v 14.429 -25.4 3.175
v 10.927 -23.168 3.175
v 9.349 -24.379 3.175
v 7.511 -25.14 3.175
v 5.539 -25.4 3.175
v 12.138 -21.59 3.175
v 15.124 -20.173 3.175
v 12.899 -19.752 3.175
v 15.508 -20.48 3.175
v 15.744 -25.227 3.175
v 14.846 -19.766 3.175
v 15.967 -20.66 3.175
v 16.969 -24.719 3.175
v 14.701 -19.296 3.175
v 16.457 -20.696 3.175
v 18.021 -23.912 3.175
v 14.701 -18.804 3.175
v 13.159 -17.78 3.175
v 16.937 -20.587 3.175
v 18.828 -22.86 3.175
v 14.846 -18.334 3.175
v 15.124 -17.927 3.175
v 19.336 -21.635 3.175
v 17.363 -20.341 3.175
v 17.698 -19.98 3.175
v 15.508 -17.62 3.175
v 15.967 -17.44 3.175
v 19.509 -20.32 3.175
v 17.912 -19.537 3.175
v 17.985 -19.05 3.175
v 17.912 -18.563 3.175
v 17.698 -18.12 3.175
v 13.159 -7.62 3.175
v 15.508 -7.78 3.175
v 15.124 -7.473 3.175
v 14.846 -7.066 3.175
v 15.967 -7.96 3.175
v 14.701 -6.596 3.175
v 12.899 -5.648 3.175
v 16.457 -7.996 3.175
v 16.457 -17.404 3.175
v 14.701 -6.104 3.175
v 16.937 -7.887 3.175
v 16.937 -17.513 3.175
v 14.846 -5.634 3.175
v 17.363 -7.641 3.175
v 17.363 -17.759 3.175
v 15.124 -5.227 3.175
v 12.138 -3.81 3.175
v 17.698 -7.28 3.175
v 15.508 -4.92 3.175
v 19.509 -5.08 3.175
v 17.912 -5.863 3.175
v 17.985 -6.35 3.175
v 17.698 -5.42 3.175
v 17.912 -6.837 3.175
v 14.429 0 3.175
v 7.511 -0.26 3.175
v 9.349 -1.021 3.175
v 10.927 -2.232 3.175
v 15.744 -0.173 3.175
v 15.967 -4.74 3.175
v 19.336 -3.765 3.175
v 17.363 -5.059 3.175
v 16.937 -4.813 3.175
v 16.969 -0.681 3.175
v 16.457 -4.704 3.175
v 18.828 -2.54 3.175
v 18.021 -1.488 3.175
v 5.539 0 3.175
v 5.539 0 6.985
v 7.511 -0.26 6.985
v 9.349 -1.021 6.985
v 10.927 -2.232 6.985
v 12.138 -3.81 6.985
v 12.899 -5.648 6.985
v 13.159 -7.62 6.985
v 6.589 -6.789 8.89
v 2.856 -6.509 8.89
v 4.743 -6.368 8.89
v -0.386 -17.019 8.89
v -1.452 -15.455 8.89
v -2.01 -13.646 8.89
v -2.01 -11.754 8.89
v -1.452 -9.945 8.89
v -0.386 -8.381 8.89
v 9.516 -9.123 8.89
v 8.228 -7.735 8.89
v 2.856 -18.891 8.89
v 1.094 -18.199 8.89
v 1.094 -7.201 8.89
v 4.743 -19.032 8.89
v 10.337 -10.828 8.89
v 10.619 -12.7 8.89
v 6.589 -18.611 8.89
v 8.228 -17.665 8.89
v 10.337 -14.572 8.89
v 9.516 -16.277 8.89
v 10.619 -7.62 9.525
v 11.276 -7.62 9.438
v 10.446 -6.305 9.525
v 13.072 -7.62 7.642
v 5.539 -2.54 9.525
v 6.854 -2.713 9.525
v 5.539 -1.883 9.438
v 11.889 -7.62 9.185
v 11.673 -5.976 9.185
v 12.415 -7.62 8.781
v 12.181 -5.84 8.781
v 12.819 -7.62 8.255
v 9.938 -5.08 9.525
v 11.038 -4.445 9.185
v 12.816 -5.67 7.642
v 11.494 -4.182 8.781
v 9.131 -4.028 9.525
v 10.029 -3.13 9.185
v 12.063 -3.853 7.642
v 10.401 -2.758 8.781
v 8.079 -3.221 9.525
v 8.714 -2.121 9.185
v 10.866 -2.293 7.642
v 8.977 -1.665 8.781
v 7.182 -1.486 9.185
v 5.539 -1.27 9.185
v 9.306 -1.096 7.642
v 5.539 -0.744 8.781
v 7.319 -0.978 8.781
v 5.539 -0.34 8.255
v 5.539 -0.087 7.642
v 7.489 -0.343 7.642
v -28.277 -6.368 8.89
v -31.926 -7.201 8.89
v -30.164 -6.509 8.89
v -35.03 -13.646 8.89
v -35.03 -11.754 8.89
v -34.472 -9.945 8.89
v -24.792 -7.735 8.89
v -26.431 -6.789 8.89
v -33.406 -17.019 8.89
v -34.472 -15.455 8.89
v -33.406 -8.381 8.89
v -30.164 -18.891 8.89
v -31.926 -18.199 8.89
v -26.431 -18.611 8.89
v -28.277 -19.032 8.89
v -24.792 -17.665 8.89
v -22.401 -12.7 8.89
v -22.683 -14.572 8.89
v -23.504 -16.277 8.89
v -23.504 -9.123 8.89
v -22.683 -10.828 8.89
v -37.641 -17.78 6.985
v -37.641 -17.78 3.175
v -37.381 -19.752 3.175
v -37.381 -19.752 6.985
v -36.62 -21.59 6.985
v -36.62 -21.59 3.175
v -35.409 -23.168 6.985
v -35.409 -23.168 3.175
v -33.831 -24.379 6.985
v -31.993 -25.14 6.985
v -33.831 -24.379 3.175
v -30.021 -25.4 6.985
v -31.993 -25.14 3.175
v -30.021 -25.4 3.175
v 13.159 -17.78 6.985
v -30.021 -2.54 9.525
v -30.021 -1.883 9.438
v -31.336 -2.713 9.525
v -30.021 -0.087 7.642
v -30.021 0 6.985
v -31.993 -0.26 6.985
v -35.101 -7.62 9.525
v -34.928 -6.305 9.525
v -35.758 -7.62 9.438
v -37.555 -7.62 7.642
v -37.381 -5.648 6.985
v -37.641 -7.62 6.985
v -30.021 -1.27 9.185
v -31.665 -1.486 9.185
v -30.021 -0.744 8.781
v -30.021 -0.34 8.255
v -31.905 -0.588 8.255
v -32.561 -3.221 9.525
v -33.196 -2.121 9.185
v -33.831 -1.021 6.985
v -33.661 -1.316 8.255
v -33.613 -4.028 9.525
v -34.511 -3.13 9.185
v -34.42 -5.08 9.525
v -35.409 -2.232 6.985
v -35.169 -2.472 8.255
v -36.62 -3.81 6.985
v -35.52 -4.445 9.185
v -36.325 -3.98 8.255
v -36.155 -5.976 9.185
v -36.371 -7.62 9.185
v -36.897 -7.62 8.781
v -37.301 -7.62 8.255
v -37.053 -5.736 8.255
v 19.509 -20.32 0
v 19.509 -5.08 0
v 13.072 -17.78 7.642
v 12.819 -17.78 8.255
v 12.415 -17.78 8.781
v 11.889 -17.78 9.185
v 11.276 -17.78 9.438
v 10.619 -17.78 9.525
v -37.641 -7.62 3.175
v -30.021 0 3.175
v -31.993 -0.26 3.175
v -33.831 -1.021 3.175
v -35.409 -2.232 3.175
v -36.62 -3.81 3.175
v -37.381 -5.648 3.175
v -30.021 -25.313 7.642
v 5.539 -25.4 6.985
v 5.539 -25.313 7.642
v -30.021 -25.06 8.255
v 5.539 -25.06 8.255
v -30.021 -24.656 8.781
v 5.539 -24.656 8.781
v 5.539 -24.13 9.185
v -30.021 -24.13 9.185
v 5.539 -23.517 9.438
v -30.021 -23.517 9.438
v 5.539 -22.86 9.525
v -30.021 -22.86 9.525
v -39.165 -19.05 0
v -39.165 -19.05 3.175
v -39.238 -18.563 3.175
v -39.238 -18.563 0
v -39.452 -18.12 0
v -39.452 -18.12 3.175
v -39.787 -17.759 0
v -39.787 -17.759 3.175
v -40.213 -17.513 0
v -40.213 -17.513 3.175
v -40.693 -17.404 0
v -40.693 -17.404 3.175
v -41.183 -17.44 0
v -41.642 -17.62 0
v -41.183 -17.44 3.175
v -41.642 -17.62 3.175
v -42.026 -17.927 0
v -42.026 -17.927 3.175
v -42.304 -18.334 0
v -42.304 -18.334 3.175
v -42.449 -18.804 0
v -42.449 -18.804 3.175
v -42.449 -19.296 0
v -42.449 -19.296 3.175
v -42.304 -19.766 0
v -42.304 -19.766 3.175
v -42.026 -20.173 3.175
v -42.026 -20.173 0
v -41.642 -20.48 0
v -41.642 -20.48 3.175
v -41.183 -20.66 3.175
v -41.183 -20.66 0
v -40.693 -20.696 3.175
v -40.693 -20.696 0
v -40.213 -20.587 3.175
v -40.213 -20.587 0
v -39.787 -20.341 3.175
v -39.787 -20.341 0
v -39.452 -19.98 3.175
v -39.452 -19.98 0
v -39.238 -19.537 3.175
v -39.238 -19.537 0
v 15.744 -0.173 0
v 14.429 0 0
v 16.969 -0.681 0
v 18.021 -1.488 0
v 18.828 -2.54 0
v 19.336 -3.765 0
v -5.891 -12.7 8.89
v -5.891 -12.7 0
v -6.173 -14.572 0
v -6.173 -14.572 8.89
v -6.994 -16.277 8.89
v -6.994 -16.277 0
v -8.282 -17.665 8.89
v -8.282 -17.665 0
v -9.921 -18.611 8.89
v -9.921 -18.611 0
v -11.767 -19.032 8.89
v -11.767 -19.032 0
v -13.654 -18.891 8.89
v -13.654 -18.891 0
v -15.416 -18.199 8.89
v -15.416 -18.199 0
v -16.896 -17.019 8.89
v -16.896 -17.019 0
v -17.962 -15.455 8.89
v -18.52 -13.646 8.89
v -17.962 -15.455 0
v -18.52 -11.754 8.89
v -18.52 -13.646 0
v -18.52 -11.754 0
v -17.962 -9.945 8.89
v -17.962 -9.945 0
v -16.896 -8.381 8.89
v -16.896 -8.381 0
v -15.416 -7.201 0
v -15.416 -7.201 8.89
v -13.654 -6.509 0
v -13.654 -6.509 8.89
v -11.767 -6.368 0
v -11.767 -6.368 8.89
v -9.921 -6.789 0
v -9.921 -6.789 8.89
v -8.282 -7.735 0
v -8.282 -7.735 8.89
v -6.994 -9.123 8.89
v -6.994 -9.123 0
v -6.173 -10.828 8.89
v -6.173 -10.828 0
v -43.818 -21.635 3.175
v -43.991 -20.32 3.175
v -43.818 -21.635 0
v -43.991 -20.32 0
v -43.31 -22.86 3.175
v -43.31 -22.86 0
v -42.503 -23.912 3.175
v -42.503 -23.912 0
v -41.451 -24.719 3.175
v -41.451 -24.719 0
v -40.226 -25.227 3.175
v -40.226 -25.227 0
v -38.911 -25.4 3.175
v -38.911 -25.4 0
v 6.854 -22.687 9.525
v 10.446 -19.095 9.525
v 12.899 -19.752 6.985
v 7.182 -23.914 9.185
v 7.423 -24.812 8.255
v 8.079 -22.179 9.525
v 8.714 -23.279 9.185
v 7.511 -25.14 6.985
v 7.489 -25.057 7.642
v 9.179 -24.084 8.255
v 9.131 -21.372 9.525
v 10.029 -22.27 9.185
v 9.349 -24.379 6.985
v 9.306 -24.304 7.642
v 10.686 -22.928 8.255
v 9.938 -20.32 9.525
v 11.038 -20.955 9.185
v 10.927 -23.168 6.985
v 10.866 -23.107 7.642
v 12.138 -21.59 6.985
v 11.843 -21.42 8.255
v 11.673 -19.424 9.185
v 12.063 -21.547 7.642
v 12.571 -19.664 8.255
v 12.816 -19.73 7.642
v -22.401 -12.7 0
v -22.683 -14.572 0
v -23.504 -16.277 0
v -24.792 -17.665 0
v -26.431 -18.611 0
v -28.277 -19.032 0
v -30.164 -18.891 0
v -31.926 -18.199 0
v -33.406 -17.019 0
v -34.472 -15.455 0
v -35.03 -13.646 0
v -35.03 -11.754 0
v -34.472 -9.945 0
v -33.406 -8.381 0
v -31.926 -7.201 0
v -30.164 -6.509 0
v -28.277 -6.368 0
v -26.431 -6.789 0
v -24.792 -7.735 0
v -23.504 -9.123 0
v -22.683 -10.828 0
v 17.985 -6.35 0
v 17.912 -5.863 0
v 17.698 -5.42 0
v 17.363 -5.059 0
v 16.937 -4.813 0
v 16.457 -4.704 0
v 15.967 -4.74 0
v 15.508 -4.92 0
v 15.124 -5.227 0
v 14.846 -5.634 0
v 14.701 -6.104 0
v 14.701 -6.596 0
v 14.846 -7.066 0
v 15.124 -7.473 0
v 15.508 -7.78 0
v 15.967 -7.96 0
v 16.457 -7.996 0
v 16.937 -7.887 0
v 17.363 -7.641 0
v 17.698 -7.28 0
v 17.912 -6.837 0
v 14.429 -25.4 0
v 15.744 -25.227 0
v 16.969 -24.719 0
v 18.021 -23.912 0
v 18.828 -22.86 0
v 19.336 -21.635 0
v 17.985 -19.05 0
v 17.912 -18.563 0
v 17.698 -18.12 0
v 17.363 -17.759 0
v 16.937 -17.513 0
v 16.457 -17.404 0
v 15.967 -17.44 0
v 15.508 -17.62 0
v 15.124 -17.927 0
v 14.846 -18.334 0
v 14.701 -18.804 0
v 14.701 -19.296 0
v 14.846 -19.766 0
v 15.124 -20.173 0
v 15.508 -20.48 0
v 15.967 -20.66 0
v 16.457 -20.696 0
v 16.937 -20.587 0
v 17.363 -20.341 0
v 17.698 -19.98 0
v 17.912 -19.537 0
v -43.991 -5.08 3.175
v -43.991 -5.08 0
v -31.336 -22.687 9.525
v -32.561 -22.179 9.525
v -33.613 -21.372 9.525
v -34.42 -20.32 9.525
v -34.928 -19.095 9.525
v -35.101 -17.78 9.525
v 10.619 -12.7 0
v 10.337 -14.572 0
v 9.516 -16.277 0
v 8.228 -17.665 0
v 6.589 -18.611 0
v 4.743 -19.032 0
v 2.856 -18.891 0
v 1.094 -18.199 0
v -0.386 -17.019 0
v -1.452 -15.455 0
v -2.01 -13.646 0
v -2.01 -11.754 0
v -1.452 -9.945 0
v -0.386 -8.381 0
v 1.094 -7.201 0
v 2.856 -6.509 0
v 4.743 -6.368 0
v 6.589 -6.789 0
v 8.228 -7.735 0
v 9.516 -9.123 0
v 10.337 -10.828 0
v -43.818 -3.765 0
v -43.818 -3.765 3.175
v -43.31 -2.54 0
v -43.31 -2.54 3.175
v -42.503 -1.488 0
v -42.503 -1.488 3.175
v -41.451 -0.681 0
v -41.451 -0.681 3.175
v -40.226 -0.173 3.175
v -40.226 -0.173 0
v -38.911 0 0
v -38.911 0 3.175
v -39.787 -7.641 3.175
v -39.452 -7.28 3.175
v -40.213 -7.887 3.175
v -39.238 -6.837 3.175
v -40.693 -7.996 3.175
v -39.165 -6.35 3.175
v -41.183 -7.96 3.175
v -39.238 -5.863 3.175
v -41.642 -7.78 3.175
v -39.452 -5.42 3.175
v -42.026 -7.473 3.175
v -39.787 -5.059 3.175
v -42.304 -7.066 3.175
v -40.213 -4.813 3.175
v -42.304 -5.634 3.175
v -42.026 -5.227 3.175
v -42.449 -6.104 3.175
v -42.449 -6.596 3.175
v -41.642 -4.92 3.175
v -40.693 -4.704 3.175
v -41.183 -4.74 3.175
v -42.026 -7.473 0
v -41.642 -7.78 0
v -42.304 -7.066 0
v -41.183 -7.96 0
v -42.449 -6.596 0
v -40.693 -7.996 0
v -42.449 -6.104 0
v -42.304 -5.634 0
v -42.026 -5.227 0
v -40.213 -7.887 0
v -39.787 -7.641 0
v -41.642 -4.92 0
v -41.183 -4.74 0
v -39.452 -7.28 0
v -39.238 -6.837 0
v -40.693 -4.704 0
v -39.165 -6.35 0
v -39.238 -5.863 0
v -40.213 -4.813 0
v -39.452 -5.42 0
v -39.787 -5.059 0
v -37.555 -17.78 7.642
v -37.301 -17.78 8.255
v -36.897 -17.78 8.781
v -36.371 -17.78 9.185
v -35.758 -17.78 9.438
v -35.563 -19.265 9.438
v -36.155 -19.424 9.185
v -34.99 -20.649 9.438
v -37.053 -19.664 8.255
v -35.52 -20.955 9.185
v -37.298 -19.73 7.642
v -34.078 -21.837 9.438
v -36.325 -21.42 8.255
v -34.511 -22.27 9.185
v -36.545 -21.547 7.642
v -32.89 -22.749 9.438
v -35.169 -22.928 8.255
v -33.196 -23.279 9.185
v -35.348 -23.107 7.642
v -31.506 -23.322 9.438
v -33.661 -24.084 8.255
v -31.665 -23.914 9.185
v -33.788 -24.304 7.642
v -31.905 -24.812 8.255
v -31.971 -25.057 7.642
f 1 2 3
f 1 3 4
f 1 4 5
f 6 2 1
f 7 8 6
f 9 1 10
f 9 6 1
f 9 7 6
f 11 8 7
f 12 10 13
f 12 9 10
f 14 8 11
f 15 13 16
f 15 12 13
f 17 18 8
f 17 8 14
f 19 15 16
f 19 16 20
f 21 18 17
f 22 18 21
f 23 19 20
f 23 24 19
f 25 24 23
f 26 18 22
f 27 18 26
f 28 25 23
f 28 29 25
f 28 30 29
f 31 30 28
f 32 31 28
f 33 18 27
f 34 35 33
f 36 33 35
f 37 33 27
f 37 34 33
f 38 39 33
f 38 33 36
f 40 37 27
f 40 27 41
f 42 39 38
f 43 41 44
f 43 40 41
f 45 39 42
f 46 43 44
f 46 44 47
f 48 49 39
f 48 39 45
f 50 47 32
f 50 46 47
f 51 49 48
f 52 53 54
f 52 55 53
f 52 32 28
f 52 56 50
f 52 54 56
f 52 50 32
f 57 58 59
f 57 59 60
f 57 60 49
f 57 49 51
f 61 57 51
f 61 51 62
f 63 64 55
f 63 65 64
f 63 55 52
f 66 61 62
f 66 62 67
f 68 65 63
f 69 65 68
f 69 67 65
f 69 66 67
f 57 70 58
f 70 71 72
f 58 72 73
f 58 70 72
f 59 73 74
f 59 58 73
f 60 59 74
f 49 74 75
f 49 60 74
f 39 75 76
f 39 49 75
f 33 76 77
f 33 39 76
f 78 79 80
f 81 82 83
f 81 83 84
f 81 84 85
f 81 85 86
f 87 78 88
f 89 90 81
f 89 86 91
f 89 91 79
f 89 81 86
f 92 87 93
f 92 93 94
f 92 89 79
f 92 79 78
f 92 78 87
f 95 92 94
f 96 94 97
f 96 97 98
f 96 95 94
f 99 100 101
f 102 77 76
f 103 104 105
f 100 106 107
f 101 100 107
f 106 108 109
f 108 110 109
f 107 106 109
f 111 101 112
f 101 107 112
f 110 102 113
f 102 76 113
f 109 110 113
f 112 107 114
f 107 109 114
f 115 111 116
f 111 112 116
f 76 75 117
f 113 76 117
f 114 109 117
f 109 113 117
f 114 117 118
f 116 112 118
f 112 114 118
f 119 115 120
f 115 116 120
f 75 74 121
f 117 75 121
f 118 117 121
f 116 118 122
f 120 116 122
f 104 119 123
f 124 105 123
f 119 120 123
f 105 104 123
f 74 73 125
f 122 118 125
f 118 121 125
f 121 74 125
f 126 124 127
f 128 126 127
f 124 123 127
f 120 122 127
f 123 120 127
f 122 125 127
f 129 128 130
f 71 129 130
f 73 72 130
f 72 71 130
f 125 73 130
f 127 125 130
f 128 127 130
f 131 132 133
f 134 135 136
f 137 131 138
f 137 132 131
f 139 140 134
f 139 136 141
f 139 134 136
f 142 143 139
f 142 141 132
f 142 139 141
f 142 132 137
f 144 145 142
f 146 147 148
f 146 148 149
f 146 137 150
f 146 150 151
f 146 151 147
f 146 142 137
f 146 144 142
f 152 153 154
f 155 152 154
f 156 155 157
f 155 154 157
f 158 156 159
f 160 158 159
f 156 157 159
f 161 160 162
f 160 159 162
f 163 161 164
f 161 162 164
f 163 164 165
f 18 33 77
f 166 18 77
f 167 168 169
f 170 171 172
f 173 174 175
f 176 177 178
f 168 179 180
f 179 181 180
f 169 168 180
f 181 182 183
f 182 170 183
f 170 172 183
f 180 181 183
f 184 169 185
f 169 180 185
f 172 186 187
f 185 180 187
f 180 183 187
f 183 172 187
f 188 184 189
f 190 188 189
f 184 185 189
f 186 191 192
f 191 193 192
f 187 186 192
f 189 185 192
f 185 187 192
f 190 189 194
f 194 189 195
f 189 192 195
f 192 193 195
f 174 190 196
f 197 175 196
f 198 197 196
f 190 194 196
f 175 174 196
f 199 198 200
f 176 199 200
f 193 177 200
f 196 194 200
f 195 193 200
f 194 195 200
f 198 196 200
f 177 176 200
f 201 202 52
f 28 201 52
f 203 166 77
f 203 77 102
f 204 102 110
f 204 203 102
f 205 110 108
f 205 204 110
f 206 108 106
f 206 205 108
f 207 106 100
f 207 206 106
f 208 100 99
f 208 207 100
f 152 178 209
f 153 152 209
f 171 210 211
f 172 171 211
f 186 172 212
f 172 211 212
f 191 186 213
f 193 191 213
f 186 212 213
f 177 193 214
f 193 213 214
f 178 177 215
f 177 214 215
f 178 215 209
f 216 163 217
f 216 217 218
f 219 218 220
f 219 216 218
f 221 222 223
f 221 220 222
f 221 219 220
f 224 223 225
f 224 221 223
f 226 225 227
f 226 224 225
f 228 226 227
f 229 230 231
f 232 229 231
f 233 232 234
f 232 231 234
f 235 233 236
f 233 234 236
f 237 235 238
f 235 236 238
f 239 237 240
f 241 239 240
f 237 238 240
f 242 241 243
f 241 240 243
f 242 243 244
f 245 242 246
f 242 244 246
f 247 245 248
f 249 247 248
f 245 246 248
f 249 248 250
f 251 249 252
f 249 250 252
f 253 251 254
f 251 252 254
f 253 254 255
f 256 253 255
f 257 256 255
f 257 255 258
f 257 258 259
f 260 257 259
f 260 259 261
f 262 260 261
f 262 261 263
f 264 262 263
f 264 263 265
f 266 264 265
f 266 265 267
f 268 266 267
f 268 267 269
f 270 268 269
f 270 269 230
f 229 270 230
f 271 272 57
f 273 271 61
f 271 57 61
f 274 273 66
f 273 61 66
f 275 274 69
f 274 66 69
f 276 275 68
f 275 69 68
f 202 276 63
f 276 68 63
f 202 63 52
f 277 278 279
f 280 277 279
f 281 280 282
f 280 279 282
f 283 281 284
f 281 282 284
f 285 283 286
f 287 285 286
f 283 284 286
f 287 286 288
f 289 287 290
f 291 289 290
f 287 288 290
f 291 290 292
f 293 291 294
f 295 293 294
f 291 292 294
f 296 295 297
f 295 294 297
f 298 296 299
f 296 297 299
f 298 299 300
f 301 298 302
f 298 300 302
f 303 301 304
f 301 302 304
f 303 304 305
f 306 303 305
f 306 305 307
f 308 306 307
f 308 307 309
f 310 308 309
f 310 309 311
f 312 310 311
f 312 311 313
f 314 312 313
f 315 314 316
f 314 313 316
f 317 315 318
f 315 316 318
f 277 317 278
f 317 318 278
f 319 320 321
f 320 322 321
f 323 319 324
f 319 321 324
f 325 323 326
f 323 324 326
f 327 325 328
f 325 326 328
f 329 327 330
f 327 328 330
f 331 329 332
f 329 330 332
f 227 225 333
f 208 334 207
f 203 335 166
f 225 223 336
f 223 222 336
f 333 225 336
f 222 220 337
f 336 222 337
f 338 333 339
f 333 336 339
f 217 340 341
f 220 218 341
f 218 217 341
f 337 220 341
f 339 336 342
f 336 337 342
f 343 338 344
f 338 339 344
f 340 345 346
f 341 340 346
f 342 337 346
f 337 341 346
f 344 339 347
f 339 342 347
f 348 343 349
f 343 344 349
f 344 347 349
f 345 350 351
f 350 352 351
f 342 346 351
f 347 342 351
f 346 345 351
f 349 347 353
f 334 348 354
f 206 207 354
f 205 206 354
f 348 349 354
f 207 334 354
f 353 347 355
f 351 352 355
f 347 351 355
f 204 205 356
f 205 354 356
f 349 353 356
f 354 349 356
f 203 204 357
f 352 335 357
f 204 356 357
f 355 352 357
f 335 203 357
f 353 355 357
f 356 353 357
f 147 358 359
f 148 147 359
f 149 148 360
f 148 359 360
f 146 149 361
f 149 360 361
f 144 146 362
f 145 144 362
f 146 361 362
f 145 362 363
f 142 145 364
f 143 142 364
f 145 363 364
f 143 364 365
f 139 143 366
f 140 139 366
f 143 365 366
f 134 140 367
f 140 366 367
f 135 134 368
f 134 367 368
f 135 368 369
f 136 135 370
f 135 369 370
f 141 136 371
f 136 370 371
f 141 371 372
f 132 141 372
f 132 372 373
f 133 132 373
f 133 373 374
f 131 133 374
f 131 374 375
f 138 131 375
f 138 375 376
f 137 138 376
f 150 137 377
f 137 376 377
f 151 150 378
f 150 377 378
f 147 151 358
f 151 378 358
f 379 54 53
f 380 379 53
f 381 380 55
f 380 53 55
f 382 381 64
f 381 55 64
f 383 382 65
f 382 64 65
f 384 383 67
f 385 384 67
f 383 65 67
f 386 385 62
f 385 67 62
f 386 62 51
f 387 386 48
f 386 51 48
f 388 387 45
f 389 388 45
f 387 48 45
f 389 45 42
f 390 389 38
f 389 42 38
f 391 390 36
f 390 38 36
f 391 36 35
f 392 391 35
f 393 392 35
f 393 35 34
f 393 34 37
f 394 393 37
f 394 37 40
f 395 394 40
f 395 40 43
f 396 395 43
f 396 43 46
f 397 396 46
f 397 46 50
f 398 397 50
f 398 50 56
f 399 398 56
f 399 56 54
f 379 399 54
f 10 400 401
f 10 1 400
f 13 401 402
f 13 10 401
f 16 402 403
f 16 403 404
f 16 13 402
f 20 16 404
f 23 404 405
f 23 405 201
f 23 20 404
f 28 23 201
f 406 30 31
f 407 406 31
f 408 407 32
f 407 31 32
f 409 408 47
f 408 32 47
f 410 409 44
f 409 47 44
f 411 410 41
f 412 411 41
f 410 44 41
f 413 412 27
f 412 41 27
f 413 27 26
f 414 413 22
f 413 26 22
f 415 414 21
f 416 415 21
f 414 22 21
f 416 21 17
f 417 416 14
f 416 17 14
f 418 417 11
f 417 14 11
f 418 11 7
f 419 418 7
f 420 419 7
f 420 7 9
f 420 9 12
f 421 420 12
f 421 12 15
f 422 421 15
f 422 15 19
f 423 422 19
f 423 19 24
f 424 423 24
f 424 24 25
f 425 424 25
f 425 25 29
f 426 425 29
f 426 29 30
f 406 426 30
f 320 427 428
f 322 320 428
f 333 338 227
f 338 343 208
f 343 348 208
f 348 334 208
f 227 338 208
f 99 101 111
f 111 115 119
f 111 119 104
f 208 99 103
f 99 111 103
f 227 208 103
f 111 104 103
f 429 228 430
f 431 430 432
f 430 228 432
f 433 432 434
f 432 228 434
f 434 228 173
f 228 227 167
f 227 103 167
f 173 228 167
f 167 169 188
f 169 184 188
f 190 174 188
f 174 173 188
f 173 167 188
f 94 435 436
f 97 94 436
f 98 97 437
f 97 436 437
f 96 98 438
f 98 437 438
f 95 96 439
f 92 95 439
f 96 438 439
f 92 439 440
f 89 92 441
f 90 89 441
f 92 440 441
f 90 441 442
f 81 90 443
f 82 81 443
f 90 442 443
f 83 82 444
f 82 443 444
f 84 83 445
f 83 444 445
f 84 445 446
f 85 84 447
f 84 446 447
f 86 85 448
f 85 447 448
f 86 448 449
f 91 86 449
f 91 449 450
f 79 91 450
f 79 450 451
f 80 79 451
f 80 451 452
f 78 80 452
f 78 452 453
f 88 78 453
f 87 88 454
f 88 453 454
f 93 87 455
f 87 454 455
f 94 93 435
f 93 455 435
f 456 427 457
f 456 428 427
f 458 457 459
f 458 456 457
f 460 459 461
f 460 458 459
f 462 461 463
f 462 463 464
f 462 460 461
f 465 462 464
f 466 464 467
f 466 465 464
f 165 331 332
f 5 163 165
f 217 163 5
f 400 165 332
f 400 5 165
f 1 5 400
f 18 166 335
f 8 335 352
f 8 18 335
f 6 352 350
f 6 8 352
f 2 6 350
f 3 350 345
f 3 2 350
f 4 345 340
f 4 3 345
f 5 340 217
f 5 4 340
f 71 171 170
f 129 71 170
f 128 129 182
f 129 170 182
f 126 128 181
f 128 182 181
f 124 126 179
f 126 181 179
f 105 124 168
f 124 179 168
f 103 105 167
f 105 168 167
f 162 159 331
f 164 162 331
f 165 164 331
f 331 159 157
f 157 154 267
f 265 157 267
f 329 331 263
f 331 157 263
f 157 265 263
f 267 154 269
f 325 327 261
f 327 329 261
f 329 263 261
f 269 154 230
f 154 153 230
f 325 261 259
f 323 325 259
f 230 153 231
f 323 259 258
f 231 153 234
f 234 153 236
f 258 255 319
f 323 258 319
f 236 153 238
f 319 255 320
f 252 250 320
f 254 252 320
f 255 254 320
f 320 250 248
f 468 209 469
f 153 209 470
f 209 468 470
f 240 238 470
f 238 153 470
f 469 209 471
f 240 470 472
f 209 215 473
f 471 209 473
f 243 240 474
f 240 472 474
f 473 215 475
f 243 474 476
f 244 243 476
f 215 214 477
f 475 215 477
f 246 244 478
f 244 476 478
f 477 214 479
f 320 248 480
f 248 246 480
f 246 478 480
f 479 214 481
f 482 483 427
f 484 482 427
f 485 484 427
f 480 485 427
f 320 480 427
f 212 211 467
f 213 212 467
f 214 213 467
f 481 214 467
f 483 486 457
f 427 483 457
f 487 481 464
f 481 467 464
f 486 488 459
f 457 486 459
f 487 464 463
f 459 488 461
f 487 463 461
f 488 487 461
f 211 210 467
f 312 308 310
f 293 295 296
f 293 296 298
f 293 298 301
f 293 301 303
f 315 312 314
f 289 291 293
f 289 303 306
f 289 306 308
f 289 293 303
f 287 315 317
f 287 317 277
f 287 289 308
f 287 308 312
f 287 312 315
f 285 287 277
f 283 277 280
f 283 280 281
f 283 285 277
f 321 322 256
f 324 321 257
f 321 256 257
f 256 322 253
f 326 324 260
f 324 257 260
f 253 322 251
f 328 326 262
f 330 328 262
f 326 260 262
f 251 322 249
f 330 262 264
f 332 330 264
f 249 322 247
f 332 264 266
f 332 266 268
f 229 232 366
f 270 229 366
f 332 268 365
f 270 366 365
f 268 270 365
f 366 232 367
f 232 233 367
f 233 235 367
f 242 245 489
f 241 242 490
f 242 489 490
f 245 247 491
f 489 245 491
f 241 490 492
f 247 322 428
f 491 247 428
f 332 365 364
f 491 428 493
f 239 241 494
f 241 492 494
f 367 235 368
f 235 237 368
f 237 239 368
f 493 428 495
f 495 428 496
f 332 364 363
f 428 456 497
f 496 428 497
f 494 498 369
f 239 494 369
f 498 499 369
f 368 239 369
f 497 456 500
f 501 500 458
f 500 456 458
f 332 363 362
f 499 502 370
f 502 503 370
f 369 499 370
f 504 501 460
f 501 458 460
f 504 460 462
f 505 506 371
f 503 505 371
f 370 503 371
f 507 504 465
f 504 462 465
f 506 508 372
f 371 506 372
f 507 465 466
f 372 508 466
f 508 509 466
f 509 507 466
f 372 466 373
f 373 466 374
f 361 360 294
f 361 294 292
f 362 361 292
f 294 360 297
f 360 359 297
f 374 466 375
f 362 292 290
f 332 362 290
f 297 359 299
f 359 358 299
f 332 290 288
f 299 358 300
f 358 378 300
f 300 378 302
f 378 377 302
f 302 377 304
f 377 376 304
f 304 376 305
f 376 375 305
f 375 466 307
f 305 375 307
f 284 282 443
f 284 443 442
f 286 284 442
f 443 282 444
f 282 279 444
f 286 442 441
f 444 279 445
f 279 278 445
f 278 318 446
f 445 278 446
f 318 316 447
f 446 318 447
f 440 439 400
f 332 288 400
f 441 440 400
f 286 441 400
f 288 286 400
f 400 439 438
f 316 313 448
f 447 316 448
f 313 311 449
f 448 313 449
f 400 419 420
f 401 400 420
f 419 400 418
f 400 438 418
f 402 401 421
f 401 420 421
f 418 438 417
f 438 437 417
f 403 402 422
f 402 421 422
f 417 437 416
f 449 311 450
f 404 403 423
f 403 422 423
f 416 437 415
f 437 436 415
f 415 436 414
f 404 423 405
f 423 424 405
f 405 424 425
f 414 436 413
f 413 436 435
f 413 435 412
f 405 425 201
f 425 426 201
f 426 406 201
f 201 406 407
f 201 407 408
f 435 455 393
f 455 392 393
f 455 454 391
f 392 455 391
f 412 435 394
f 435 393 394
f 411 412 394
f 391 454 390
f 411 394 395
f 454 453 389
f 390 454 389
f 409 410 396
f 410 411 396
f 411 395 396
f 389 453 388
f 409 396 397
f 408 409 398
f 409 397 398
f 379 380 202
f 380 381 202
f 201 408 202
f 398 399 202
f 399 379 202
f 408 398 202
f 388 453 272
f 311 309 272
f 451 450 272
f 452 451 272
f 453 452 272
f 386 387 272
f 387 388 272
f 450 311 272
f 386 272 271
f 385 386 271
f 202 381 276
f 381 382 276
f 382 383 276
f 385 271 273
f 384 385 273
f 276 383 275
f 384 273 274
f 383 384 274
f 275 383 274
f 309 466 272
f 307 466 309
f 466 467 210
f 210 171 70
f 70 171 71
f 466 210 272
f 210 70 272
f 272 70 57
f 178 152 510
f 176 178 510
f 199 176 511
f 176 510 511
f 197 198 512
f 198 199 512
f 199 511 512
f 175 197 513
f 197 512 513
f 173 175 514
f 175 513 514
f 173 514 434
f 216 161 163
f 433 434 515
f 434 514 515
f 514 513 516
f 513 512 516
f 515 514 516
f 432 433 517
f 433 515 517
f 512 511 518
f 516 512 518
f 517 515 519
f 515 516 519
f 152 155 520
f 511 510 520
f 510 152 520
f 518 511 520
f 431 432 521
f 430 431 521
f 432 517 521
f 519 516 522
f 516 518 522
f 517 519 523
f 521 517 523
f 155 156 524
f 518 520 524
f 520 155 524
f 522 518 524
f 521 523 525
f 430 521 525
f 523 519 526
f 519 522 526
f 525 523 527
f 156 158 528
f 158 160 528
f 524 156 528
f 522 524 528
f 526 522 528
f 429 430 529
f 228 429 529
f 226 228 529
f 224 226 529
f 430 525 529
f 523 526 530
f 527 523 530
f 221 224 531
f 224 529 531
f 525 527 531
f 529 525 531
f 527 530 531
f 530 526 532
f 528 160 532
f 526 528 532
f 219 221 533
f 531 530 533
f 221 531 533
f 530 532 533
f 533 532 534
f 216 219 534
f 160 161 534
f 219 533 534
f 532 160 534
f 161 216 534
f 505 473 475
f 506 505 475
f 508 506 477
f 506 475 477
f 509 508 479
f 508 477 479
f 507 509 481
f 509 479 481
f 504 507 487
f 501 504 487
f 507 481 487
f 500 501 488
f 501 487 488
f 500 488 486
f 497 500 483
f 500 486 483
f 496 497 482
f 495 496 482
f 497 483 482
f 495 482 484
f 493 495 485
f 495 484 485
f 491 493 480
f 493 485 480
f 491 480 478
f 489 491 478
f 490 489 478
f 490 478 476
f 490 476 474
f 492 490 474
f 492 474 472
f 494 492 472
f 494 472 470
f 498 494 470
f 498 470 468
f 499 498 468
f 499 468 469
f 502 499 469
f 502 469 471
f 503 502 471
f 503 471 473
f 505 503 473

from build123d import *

# Parameters (mm, degrees)
F1_DEPTH     = 25.4
F3_R         = 1.651
F4_DEPTH     = 3.176
F5_R         = 6.35
F6_DEPTH     = 8.89
F7_R         = 5.08
F8_R         = 2.54
F9_T1_DEPTH  = 6.35
F9_T4_ANGLE  = 90
F9_T6_ANGLE  = 90
F9_T8_ANGLE  = 90
F9_T10_ANGLE = 90


# Not quite as in the source:
# - a fillet or chamfer that OpenCascade refuses, or shapes differently, is made with other operations: its cross-section is extruded or revolved along the edge and cut away or added
# - a feature names something its author has since deleted; it is built from what else it names


with BuildPart() as f1:
    # F0 (on Front) → F1 (new body)
    with BuildSketch(Plane.XZ):
        Polygon((-43.9910670578, 3.175), (-43.9910670578, 0), (19.5089329422, 0), (19.5089329422, 3.175), (13.1589329422, 3.175), (13.1589329422, 9.525), (-37.6410670578, 9.525), (-37.6410670578, 3.175), align=None)
    extrude(amount=F1_DEPTH)

    # F3 (on face) → F4 (cut, through all)
    with BuildSketch(Plane.XY.offset(3.175)):
        with Locations((-40.8160670578, -19.05)):
            Circle(F3_R)
        with Locations((-40.8160670578, -6.35)):
            Circle(F3_R)
        with Locations((16.3339329422, -6.35)):
            Circle(F3_R)
        with Locations((16.3339329422, -19.05)):
            Circle(F3_R)
    extrude(amount=-F4_DEPTH, mode=Mode.SUBTRACT)

    # F5 (on face) → F6 (cut)
    with BuildSketch(Plane(origin=(0, 0, 0), x_dir=(1, 0, 0), z_dir=(0, 0, -1))):
        with Locations((-28.7510670578, 12.7)):
            Circle(F5_R)
        with Locations((4.2689329422, 12.7)):
            Circle(F5_R)
        with Locations((-12.2410670578, 12.7)):
            Circle(F5_R)
    extrude(amount=-F6_DEPTH, mode=Mode.SUBTRACT)

    # F7
    f7_edges = [f1.edges().sort_by_distance(p)[0] for p in [
        (19.508933, -25.4, 1.5875),
        (19.508933, 0, 1.5875),
        (-43.991067, -25.4, 1.5875),
        (-43.991067, 0, 1.5875),
    ]]
    fillet(f7_edges, radius=F7_R)

    # F8
    f8_edges = [f1.edges().sort_by_distance(p)[0] for p in [
        (-12.241067, -25.4, 9.525),
        (-37.641067, -12.7, 9.525),
        (-12.241067, 0, 9.525),
        (13.158933, -12.7, 9.525),
    ]]
    fillet(f8_edges, radius=F8_R)

    # F9: fillet of radius 7.62 on 4 edges, made by hand

    # F9_s2 → F9_t1 (cut)
    with BuildSketch(Plane.XY.offset(3.175)):
        with BuildLine():
            ThreePointArc((-37.6410670578, -17.78), (-35.4092207305, -23.1681536726), (-30.0210670578, -25.4))
            Line((-30.0210670578, -25.4), (-37.6410670578, -25.4))
            Line((-37.6410670578, -25.4), (-37.6410670578, -17.78))
        make_face()
        with BuildLine():
            ThreePointArc((13.1589329422, -17.78), (10.9270866148, -23.1681536726), (5.5389329422, -25.4))
            Line((5.5389329422, -25.4), (13.1589329422, -25.4))
            Line((13.1589329422, -25.4), (13.1589329422, -17.78))
        make_face()
        with BuildLine():
            ThreePointArc((-30.0210670578, 0), (-35.4092207305, -2.2318463274), (-37.6410670578, -7.62))
            Line((-37.6410670578, -7.62), (-37.6410670578, 0))
            Line((-37.6410670578, 0), (-30.0210670578, 0))
        make_face()
        with BuildLine():
            ThreePointArc((5.5389329422, 0), (10.9270866148, -2.2318463274), (13.1589329422, -7.62))
            Line((13.1589329422, -7.62), (13.1589329422, 0))
            Line((13.1589329422, 0), (5.5389329422, 0))
        make_face()
    extrude(amount=F9_T1_DEPTH, mode=Mode.SUBTRACT)

    # F9_s3 → F9_t4 (revolve, cut)
    with BuildSketch(Plane.XZ.offset(7.62)):
        with BuildLine():
            ThreePointArc((10.6189329422, 9.525), (12.4149841664, 8.7810512242), (13.1589329422, 6.985))
            Line((13.1589329422, 6.985), (13.1589329422, 9.525))
            Line((13.1589329422, 9.525), (10.6189329422, 9.525))
        make_face()
    revolve(axis=Axis((5.5389329422, -7.62, 9.525), (0, 0, 1)), revolution_arc=F9_T4_ANGLE, mode=Mode.SUBTRACT)

    # F9_s5 → F9_t6 (revolve, cut)
    with BuildSketch(Plane.YZ.offset(-30.0210670578)):
        with BuildLine():
            ThreePointArc((-2.54, 9.525), (-0.7439487758, 8.7810512242), (0, 6.985))
            Line((0, 6.985), (0, 9.525))
            Line((0, 9.525), (-2.54, 9.525))
        make_face()
    revolve(axis=Axis((-30.0210670578, -7.62, 9.525), (0, 0, 1)), revolution_arc=F9_T6_ANGLE, mode=Mode.SUBTRACT)

    # F9_s7 → F9_t8 (revolve, cut)
    with BuildSketch(Plane.YZ.offset(5.5389329422)):
        with BuildLine():
            ThreePointArc((-22.86, 9.525), (-24.6560512242, 8.7810512242), (-25.4, 6.985))
            Line((-25.4, 6.985), (-25.4, 9.525))
            Line((-25.4, 9.525), (-22.86, 9.525))
        make_face()
    revolve(axis=Axis((5.5389329422, -17.78, 9.525), (0, 0, 1)), revolution_arc=F9_T8_ANGLE, mode=Mode.SUBTRACT)

    # F9_s9 → F9_t10 (revolve, cut)
    with BuildSketch(Plane.XZ.offset(17.78)):
        with BuildLine():
            ThreePointArc((-35.1010670578, 9.525), (-36.8971182821, 8.7810512242), (-37.6410670578, 6.985))
            Line((-37.6410670578, 6.985), (-37.6410670578, 9.525))
            Line((-37.6410670578, 9.525), (-35.1010670578, 9.525))
        make_face()
    revolve(axis=Axis((-30.0210670578, -17.78, 9.525), (0, 0, 1)), revolution_arc=F9_T10_ANGLE, mode=Mode.SUBTRACT)


solid = f1.part
